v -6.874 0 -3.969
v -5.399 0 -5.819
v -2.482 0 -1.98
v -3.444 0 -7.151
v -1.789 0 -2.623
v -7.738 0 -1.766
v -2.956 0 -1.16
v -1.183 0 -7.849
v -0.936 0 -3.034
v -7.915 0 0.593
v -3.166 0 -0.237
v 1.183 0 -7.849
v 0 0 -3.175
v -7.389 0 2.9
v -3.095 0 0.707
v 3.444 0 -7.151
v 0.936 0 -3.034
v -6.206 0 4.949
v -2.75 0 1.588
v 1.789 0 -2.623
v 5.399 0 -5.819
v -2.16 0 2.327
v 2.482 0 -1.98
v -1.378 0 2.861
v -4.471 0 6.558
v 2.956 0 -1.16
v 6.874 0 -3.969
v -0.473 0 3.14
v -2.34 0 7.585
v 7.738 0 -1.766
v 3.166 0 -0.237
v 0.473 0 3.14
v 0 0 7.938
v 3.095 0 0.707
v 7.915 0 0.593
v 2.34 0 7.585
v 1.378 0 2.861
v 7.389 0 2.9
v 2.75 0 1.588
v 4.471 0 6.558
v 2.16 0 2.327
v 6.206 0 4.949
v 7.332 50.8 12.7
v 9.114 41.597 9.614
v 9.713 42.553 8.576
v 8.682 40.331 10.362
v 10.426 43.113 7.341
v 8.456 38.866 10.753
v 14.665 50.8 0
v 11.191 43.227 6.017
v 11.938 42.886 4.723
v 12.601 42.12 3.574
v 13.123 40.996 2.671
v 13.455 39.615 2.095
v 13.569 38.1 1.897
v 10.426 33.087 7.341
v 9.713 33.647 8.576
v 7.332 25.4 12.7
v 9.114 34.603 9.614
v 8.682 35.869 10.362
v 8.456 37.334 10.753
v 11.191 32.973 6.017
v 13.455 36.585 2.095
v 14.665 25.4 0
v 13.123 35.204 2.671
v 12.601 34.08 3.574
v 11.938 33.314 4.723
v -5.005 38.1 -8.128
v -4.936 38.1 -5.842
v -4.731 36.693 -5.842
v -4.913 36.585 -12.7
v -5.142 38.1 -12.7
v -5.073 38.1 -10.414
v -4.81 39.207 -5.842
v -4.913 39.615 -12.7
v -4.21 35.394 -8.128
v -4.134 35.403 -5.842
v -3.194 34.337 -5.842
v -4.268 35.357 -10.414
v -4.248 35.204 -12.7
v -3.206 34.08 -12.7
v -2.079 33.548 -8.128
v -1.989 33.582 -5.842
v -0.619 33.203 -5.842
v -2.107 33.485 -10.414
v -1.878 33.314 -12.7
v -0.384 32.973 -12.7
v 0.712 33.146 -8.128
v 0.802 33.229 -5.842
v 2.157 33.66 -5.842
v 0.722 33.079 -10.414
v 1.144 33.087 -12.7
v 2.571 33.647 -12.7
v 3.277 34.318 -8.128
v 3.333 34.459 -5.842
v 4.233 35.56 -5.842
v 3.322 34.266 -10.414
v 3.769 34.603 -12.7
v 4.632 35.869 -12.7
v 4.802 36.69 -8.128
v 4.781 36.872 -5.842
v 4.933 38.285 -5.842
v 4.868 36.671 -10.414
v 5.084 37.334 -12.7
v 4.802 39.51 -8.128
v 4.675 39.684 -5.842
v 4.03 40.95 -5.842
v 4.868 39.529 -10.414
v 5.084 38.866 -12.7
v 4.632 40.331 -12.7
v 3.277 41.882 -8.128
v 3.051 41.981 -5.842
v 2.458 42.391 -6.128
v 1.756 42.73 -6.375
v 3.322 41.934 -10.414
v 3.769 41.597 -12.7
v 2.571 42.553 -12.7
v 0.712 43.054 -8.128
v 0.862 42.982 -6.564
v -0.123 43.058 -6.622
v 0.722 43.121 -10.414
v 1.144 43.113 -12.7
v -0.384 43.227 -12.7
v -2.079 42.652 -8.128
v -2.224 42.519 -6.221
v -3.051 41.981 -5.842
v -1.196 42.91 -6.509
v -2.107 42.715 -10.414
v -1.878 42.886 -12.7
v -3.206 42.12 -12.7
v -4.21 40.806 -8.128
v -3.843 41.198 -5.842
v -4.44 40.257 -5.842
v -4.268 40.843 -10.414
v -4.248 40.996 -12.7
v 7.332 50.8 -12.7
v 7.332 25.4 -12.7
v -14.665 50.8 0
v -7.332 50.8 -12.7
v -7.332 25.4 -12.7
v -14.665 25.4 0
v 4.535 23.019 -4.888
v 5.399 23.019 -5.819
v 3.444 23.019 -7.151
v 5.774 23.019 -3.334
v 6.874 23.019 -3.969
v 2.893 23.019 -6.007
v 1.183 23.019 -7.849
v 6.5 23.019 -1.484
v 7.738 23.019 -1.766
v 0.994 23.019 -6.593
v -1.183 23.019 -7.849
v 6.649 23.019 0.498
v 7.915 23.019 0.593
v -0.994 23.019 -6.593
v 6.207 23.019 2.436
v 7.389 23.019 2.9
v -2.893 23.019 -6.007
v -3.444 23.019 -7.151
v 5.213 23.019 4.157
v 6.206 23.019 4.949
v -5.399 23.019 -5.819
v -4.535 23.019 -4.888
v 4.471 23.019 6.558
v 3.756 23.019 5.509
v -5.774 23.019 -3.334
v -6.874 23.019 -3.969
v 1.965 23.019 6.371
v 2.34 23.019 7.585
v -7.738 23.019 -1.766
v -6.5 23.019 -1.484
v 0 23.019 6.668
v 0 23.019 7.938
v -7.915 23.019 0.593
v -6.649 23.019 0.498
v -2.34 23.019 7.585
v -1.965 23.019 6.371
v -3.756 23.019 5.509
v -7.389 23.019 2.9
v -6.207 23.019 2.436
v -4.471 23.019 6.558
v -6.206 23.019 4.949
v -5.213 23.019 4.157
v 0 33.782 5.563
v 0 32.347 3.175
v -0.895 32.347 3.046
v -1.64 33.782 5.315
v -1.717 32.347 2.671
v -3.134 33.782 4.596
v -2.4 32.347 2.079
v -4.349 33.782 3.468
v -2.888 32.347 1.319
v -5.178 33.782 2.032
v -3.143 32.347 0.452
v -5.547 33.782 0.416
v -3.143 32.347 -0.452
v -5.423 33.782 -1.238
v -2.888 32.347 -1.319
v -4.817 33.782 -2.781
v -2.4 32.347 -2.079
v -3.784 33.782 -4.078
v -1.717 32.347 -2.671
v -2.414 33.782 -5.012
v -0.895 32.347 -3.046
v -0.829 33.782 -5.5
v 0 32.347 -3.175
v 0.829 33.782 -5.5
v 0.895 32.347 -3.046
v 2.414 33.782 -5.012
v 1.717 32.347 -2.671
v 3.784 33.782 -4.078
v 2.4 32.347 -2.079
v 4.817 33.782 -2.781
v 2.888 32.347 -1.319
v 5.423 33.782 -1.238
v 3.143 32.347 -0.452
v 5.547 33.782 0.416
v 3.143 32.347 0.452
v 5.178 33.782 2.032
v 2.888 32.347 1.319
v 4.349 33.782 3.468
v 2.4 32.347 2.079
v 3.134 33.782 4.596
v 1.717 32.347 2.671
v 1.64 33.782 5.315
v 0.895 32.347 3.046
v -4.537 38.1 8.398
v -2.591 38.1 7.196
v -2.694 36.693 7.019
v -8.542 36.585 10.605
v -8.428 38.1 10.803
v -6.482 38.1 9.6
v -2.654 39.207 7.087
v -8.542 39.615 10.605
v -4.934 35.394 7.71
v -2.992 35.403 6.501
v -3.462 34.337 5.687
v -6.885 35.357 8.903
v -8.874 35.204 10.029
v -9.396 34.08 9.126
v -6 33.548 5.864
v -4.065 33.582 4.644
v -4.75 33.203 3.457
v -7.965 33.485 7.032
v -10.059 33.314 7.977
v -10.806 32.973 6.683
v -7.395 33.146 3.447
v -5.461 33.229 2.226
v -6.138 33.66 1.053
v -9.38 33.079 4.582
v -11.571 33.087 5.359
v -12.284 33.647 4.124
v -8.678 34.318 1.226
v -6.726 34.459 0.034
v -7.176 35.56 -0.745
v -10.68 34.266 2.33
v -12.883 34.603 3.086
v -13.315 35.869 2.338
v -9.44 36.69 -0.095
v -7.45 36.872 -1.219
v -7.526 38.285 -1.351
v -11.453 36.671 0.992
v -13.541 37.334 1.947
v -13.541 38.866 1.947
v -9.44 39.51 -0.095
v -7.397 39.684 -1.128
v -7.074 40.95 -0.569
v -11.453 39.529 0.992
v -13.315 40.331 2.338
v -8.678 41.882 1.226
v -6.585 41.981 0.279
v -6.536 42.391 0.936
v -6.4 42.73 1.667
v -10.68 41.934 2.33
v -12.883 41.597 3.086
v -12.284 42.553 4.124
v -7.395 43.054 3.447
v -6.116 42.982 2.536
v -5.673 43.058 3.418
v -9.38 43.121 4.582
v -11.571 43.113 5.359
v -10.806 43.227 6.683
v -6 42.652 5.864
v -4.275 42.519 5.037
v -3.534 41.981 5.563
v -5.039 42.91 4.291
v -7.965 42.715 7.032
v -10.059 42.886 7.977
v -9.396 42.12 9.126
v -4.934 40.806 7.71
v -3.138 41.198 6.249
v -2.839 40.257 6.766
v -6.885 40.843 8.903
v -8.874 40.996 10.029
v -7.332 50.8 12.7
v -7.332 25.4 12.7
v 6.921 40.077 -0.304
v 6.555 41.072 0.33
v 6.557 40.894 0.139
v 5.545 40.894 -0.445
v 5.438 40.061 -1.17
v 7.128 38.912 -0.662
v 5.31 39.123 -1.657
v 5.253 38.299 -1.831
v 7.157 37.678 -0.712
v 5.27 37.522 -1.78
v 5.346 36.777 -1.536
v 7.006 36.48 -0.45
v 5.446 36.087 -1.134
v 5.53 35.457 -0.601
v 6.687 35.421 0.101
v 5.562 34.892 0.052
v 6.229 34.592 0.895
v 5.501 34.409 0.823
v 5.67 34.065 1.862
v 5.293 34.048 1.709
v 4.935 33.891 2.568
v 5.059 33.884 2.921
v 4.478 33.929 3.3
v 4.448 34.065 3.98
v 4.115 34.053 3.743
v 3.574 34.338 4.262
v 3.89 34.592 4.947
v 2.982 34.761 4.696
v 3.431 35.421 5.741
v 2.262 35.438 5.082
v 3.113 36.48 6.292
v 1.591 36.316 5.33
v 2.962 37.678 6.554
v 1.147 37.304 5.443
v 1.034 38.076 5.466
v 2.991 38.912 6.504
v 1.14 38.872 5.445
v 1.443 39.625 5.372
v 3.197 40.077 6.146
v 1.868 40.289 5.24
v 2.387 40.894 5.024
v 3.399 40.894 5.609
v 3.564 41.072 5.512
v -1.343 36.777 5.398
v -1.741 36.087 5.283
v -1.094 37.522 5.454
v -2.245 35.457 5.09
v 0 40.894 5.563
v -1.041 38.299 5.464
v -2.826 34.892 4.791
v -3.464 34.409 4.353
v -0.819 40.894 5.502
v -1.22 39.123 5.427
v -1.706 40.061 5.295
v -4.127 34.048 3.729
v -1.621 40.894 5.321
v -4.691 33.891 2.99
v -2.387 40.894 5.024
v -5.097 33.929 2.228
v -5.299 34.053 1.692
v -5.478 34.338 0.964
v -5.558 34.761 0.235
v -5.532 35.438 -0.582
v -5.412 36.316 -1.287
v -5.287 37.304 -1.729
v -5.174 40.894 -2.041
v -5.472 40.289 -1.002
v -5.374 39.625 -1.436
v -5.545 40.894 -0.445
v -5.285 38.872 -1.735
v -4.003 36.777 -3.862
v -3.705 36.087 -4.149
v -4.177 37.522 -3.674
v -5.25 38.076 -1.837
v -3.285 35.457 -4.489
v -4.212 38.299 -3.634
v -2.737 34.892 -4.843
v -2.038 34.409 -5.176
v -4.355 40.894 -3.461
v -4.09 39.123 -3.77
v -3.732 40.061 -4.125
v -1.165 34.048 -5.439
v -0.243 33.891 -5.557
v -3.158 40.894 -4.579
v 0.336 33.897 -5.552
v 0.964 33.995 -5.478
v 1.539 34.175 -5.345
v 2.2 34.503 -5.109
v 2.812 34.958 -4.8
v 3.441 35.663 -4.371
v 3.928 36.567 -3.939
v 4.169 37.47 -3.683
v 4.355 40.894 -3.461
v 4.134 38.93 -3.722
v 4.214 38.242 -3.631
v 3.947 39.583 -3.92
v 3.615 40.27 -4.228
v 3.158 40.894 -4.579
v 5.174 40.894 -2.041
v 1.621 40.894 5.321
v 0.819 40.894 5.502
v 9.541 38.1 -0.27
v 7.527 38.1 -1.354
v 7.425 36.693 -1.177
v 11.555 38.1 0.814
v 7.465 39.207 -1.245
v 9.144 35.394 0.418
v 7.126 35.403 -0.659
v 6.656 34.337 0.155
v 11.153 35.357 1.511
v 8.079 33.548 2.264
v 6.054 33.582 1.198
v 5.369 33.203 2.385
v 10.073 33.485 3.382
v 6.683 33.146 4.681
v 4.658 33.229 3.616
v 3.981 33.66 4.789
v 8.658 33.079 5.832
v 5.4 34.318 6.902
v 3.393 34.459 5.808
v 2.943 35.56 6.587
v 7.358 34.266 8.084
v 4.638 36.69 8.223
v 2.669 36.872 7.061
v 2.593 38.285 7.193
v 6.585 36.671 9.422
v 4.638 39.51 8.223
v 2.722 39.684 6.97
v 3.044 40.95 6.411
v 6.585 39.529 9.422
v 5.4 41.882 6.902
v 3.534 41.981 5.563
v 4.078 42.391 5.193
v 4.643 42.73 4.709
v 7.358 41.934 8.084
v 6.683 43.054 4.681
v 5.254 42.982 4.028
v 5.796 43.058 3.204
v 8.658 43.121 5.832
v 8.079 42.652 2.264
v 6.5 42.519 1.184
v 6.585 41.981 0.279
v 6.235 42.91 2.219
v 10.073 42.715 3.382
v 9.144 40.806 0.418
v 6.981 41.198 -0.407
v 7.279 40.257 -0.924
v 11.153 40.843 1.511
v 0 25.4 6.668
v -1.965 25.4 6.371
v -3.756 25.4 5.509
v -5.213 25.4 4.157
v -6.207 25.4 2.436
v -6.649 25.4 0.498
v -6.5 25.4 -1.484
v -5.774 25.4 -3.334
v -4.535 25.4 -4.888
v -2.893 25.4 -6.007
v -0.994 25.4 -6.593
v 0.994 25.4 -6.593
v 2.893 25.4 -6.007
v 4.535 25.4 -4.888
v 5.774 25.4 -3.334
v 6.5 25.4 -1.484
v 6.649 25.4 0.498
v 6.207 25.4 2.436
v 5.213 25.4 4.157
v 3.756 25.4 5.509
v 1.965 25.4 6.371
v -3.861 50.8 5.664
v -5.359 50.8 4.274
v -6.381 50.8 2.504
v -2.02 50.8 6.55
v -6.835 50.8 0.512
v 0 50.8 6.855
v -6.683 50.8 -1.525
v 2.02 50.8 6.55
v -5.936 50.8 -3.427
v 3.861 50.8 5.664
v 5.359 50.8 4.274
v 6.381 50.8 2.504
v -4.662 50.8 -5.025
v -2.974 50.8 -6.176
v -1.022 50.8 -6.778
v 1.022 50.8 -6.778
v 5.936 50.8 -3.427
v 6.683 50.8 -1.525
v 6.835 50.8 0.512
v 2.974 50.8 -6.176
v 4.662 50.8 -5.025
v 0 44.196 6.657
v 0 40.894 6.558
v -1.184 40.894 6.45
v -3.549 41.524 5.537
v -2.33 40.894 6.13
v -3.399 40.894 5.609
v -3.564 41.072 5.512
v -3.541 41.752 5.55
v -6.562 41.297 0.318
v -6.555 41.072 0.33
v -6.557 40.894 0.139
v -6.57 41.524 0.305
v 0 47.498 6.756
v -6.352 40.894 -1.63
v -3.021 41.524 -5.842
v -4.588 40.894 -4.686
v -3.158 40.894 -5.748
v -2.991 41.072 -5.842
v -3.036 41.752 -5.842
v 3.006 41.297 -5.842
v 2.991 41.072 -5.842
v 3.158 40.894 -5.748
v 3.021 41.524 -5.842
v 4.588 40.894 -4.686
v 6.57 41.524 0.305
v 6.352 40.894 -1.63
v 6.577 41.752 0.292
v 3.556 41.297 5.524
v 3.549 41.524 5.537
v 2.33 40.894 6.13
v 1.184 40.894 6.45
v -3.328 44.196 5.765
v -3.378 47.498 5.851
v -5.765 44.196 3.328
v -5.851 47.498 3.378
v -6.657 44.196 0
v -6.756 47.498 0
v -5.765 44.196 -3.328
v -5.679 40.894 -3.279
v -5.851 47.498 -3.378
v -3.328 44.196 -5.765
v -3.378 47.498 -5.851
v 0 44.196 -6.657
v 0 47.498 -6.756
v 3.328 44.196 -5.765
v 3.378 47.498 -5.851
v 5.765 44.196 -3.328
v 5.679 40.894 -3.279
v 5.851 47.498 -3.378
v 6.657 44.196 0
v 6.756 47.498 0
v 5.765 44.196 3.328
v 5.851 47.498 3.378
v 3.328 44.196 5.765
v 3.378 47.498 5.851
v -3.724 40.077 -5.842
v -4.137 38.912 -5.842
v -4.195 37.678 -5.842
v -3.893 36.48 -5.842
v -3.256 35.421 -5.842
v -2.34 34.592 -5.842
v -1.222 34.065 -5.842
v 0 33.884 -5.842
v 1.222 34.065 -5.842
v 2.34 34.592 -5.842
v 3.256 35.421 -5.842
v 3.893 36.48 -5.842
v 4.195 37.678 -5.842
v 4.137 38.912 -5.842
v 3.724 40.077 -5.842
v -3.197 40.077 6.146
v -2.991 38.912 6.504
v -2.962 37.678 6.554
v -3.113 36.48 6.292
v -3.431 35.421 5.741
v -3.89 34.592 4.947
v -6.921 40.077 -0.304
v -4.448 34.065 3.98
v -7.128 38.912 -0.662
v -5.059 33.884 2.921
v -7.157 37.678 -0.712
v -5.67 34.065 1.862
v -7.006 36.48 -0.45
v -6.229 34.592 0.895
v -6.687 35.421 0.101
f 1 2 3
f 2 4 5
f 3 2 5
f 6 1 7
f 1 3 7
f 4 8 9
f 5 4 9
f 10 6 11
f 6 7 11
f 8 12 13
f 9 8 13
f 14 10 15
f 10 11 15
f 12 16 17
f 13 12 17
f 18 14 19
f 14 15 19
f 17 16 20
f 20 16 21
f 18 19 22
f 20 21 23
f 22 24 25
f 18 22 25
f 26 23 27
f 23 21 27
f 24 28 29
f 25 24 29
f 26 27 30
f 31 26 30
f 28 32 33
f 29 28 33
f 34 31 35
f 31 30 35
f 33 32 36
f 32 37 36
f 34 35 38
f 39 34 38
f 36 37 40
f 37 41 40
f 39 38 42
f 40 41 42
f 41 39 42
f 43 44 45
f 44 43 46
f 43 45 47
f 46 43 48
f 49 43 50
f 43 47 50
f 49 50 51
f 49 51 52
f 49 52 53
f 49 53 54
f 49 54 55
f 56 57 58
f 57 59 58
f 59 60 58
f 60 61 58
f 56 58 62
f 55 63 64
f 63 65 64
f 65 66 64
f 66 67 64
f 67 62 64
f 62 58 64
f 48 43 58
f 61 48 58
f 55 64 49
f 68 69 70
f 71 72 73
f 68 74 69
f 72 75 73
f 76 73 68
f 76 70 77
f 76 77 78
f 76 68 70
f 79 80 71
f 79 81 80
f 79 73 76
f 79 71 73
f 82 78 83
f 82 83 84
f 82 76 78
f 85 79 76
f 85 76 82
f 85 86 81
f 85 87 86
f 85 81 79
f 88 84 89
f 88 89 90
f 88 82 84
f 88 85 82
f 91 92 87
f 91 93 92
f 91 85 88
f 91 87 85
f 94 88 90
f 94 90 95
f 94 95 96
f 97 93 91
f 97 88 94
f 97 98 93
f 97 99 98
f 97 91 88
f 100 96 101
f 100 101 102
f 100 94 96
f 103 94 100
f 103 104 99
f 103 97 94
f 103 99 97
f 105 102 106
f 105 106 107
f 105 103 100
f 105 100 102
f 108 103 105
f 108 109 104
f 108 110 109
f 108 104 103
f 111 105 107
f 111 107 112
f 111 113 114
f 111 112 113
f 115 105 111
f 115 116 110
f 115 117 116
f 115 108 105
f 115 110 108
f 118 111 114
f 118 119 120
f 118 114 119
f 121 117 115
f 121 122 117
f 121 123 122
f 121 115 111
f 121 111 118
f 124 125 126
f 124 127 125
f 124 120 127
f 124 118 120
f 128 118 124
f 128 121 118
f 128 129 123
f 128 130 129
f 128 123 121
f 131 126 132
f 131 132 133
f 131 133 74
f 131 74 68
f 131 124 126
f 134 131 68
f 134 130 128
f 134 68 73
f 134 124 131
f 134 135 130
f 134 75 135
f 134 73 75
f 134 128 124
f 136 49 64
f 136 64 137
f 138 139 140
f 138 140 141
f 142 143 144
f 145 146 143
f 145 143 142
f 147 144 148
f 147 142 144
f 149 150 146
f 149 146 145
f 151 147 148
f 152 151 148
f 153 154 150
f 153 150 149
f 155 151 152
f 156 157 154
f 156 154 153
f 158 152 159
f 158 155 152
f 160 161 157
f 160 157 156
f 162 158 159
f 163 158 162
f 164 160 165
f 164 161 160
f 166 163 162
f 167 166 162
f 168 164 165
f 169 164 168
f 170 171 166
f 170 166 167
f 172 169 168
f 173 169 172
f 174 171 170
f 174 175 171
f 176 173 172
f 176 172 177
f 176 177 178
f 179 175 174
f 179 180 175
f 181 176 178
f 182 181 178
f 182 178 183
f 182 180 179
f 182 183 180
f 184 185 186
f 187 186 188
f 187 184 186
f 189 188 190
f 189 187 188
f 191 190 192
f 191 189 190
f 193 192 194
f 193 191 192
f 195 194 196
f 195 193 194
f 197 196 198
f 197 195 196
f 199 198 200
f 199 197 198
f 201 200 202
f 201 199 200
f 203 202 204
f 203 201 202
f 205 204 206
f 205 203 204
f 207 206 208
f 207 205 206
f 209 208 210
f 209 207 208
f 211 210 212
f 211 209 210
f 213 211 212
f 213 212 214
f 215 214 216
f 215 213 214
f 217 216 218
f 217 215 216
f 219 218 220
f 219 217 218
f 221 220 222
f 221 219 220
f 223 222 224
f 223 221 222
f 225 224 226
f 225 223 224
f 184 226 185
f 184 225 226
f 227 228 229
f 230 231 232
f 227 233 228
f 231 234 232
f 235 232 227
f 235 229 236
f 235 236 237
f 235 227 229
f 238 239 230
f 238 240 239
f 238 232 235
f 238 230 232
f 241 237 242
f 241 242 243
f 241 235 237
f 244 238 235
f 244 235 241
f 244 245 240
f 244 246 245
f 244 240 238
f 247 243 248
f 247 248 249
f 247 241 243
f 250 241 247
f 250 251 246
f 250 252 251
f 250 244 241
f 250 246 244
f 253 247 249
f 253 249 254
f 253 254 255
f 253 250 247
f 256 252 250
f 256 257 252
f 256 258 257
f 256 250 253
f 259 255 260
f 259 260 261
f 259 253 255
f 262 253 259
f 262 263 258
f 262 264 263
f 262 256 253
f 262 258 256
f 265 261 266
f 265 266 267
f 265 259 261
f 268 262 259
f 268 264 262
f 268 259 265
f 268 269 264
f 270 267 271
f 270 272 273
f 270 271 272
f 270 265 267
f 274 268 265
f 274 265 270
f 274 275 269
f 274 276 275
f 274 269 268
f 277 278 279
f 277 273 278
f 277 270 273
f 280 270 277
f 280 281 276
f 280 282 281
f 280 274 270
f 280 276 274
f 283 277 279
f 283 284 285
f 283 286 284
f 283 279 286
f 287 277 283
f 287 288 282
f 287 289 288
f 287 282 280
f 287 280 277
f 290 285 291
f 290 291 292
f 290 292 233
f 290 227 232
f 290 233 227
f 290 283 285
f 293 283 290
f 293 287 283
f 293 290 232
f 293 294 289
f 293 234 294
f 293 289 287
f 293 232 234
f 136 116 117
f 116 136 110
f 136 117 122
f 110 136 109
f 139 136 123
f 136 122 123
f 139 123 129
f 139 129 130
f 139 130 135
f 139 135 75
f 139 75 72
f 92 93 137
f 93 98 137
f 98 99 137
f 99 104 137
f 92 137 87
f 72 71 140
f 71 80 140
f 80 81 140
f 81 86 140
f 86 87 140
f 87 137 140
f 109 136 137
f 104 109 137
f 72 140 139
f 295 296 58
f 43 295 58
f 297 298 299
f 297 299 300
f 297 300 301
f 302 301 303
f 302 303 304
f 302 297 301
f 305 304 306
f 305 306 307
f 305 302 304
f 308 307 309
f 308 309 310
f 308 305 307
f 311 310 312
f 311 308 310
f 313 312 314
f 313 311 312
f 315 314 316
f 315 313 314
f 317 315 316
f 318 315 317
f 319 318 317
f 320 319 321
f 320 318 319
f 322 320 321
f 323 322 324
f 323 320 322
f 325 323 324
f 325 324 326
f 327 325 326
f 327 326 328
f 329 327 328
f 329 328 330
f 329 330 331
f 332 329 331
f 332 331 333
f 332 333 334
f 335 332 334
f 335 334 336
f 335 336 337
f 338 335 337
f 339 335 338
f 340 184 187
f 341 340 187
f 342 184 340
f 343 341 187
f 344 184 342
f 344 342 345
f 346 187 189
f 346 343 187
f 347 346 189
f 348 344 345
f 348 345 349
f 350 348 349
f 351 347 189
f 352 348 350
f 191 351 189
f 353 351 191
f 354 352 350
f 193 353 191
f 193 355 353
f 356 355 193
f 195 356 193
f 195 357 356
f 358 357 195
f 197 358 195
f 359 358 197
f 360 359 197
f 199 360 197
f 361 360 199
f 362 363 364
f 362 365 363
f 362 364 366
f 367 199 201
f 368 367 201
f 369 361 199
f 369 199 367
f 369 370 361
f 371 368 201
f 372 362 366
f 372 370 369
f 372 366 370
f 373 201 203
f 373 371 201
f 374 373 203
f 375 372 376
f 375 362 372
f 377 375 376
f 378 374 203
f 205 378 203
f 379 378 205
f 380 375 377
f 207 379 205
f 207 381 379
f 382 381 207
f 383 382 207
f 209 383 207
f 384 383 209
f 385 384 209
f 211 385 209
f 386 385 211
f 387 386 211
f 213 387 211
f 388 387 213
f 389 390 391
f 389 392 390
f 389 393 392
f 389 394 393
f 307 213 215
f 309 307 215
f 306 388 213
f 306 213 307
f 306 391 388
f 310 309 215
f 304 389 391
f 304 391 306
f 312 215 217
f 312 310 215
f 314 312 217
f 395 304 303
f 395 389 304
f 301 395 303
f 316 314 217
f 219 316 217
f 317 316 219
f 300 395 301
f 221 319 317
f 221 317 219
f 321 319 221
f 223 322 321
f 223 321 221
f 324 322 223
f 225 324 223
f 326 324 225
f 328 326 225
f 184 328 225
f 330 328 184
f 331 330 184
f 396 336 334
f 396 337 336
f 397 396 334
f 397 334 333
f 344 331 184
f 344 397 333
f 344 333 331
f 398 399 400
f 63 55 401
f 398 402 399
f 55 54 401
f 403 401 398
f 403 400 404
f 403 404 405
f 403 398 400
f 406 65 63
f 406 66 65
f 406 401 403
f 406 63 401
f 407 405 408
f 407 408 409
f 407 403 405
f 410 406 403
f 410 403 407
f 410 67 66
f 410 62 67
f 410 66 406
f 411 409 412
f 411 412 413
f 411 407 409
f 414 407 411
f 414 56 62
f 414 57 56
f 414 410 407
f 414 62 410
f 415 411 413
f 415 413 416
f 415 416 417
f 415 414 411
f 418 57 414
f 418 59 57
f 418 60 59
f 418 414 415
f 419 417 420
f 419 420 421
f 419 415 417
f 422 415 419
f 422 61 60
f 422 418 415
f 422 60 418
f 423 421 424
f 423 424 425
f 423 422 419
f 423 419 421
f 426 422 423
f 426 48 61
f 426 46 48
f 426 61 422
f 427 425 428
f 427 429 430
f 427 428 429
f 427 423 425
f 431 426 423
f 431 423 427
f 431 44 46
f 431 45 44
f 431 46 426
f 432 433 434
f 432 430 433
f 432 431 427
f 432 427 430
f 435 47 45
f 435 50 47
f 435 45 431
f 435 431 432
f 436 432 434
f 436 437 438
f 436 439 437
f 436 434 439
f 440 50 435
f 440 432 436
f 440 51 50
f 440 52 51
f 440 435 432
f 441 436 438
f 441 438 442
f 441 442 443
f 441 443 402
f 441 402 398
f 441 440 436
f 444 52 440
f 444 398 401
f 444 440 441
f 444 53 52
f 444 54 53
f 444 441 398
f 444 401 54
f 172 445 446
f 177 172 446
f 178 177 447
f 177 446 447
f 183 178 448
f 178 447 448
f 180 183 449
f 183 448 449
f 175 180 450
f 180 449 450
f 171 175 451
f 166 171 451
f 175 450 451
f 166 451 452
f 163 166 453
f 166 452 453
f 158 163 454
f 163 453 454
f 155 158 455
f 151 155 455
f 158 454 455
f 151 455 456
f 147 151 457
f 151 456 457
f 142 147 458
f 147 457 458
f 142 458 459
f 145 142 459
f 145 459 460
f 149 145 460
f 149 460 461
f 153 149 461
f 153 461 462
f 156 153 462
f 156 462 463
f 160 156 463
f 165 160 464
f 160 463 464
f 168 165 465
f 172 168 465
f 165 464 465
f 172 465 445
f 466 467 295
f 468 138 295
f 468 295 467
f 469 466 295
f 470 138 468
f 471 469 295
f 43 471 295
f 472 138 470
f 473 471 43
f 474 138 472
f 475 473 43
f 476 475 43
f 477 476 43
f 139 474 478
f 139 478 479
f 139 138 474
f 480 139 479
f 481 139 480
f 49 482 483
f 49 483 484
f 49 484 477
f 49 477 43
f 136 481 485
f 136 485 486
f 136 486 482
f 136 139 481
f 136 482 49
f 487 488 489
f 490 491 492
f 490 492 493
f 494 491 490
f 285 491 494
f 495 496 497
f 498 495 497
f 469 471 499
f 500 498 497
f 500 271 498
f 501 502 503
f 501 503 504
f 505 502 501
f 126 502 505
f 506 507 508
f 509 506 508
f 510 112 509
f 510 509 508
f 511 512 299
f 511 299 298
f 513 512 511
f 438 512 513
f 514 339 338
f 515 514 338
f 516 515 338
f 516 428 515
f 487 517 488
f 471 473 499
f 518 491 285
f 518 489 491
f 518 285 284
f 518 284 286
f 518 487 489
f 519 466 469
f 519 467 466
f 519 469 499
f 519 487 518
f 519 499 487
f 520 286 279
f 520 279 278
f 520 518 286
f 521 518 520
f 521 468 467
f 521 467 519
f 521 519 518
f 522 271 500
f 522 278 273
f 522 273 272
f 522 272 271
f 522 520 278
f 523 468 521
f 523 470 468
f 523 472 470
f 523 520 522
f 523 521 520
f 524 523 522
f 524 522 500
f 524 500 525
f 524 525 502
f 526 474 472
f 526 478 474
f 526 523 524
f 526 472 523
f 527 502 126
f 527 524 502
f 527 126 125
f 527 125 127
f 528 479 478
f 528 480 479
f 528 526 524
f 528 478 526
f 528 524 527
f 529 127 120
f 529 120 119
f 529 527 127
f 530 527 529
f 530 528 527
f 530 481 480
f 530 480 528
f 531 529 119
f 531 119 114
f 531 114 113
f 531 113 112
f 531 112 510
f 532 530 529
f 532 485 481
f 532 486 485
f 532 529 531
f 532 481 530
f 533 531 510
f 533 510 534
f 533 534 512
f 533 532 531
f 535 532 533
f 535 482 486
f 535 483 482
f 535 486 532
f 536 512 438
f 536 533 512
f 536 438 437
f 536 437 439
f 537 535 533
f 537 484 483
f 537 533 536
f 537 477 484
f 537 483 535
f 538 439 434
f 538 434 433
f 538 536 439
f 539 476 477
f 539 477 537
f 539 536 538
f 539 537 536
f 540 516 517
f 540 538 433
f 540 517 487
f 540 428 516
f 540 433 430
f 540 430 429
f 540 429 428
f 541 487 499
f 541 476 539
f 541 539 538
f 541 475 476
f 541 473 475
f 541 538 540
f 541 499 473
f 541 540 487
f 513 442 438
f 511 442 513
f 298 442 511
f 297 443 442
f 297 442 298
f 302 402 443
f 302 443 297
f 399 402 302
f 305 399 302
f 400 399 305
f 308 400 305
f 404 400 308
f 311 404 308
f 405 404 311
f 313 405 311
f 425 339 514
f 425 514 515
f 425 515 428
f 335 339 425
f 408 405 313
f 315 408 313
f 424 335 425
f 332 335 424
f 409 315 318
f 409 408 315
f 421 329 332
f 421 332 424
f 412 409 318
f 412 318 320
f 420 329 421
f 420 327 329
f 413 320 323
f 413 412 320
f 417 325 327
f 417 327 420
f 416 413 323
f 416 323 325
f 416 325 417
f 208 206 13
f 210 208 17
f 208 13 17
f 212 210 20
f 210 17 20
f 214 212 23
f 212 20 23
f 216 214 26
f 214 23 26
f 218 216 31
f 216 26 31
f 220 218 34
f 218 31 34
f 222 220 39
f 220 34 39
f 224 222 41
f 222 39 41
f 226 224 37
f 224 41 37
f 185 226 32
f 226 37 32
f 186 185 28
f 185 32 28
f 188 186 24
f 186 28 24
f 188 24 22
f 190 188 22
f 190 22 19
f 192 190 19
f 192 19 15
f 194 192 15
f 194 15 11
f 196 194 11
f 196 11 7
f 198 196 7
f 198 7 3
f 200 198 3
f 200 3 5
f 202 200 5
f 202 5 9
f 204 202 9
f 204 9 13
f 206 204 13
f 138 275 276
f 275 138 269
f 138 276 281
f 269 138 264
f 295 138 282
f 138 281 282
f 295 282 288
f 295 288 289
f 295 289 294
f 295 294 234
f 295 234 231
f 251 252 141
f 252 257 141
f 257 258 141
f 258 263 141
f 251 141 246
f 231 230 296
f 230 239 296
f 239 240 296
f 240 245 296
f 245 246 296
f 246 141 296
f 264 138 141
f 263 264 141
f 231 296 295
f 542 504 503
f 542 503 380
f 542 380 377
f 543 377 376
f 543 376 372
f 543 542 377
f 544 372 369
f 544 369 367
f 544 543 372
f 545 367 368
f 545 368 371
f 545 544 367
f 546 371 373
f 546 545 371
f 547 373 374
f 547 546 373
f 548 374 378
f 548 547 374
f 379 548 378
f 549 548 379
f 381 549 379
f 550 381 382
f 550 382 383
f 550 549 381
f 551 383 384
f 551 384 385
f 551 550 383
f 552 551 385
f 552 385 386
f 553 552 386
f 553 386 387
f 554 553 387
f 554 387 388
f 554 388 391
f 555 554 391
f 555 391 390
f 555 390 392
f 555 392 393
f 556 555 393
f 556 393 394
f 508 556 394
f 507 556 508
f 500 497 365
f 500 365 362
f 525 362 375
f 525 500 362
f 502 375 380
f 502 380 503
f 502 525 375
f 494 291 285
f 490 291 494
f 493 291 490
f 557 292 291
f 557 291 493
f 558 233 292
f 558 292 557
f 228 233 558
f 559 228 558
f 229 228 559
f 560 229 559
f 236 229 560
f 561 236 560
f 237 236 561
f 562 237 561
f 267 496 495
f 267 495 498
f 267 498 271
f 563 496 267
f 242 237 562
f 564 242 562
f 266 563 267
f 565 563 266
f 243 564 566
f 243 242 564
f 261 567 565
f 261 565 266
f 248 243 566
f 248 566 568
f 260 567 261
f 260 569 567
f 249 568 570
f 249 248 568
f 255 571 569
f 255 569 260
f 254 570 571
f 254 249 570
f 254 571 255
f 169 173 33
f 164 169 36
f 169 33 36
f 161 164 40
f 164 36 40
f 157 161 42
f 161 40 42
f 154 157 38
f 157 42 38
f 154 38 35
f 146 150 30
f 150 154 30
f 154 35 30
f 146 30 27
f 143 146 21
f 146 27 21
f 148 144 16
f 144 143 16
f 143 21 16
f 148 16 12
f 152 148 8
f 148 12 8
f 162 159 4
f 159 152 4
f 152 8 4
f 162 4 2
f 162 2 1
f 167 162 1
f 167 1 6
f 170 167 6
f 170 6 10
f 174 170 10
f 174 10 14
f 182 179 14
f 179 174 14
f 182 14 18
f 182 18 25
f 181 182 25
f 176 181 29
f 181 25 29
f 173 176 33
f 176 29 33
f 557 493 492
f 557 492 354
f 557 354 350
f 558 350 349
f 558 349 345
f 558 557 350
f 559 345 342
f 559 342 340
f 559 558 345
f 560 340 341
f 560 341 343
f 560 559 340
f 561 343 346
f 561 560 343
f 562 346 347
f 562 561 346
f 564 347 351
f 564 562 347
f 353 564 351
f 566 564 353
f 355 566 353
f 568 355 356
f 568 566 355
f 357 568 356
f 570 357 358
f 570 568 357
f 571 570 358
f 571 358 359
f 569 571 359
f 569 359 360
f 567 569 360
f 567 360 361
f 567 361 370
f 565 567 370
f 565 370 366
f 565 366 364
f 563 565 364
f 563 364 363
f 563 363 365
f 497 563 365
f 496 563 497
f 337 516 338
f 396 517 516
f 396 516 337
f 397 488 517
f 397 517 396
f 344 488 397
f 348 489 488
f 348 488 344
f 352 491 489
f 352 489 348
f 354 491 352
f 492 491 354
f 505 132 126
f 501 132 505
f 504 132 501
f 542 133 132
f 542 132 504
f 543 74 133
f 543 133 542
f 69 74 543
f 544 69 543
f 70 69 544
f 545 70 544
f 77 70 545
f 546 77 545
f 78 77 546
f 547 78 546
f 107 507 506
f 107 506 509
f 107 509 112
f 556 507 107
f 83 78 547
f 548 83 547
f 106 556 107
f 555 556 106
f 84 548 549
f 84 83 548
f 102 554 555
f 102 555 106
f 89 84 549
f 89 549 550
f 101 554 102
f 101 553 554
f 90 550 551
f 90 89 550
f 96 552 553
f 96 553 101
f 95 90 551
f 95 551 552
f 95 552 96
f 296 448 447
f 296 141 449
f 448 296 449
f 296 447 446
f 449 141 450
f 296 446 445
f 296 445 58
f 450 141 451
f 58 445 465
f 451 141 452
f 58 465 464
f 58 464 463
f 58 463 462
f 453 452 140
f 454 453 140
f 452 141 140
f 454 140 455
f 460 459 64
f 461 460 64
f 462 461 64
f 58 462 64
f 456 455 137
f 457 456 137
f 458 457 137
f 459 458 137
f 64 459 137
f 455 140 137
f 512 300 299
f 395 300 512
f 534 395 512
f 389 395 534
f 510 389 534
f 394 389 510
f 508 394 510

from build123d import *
from OCP.BRepAlgoAPI import BRepAlgoAPI_Cut
from OCP.TopTools import TopTools_ListOfShape

# Parameters (mm, degrees)
SKETCH1_R           = 7.9375
BOSS_EXTRUDE1_DEPTH = 25.4
BOSS_EXTRUDE2_DEPTH = 25.4
SKETCH3_R           = 3.175
CUT_EXTRUDE1_DEPTH  = 55.37815125
SKETCH6_R           = 6.6675
CUT_EXTRUDE2_DEPTH  = 2.38125


with BuildPart() as part:
    # Sketch1 → Boss-Extrude1 (new body)
    with BuildSketch(Plane(origin=(0, 0, 0), x_dir=(1, 0, 0), z_dir=(0, 1, 0))):
        Circle(SKETCH1_R)
    extrude(amount=BOSS_EXTRUDE1_DEPTH)

    # Sketch2 → Boss-Extrude2 (add)
    with BuildSketch(Plane(origin=(0, 25.4, 0), x_dir=(1, 0, 0), z_dir=(0, 1, 0))):
        Polygon((14.664696837, 0), (7.332348419, 12.7), (-7.332348419, 12.7), (-14.664696837, 0), (-7.332348419, -12.7), (7.332348419, -12.7), align=None)
    extrude(amount=BOSS_EXTRUDE2_DEPTH)

    # Sketch3 → Cut-Extrude1 (cut, through all)
    with BuildSketch(Plane.XZ):
        Circle(SKETCH3_R)
    extrude(amount=-CUT_EXTRUDE1_DEPTH, mode=Mode.SUBTRACT)

    # Sketch6 → Cut-Extrude2 (cut)
    with BuildSketch(Plane.XZ.offset(-25.4)):
        Polygon((-14.664696837, 0), (-7.332348419, 12.7), (7.332348419, 12.7), (14.664696837, 0), (7.332348419, -12.7), (-7.332348419, -12.7), align=None)
        Circle(SKETCH6_R, mode=Mode.SUBTRACT)
    extrude(amount=CUT_EXTRUDE2_DEPTH, mode=Mode.SUBTRACT)

    # Sketch4 → 1/4 NPT Tapped Hole1 (revolve, cut)
    with BuildSketch(Plane(origin=(0, 50.8, 0), x_dir=(0, 0, 1), z_dir=(1, 0, 0))):
        Polygon((0, 0), (0, 20.360347279), (5.5626, 17.018), (5.5626, 9.906), (6.557984794, 9.906), (6.8545837, 0), align=None)
    revolve(axis=Axis((0, 57.15, 0), (0, -1, 0)), mode=Mode.SUBTRACT)


with BuildPart() as f_1_8_npt_tapped_hole1_tool:
    # Sketch9 → 1/8 NPT Tapped Hole1 (revolve)
    with BuildSketch(Plane(origin=(10.998522628, 38.1, 6.35), x_dir=(0.4999999999999991, 0, -0.8660254037844392), z_dir=(0, 1, 0))):
        Polygon((0, 0), (0, 14.217468714), (4.2164, 11.684), (4.2164, 6.858), (4.936181096, 6.858), (5.1415188, 0), align=None)
    revolve(axis=Axis((16.497783942, 38.1, 9.525), (-0.8660254037844392, 0, -0.4999999999999991)))


with BuildPart() as part_1:
    add(part.part)

    # 1/8 NPT Tapped Hole1: cut by f_1_8_npt_tapped_hole1_tool, with a tolerance
    f_1_8_npt_tapped_hole1_stock = TopTools_ListOfShape()
    f_1_8_npt_tapped_hole1_stock.Append(part_1.part.wrapped)
    f_1_8_npt_tapped_hole1_tools = TopTools_ListOfShape()
    f_1_8_npt_tapped_hole1_tools.Append(f_1_8_npt_tapped_hole1_tool.part.wrapped)
    f_1_8_npt_tapped_hole1_cut = BRepAlgoAPI_Cut()
    f_1_8_npt_tapped_hole1_cut.SetArguments(f_1_8_npt_tapped_hole1_stock)
    f_1_8_npt_tapped_hole1_cut.SetTools(f_1_8_npt_tapped_hole1_tools)
    f_1_8_npt_tapped_hole1_cut.SetFuzzyValue(0.00001)
    f_1_8_npt_tapped_hole1_cut.Build()
    add(Compound.cast(f_1_8_npt_tapped_hole1_cut.Shape()).solids(), mode=Mode.REPLACE)


with BuildPart() as f_1_8_npt_tapped_hole1_at_2_tool:
    # Sketch9 at point 2 (carried to point 2, square into its face) → 1/8 NPT Tapped Hole1 at 2 (revolve)
    with BuildSketch(Plane(origin=(0, 38.1, -12.7), x_dir=(-1, 0, 0), z_dir=(0, 1, 0))):
        Polygon((0, 0), (0, 14.217468714), (4.2164, 11.684), (4.2164, 6.858), (4.936181096, 6.858), (5.1415188, 0), align=None)
    revolve(axis=Axis((0, 38.1, -19.05), (0, 0, 1)))


with BuildPart() as part_2:
    add(part_1.part)

    # 1/8 NPT Tapped Hole1 at 2: cut by f_1_8_npt_tapped_hole1_at_2_tool, with a tolerance
    f_1_8_npt_tapped_hole1_at_2_stock = TopTools_ListOfShape()
    f_1_8_npt_tapped_hole1_at_2_stock.Append(part_2.part.wrapped)
    f_1_8_npt_tapped_hole1_at_2_tools = TopTools_ListOfShape()
    f_1_8_npt_tapped_hole1_at_2_tools.Append(f_1_8_npt_tapped_hole1_at_2_tool.part.wrapped)
    f_1_8_npt_tapped_hole1_at_2_cut = BRepAlgoAPI_Cut()
    f_1_8_npt_tapped_hole1_at_2_cut.SetArguments(f_1_8_npt_tapped_hole1_at_2_stock)
    f_1_8_npt_tapped_hole1_at_2_cut.SetTools(f_1_8_npt_tapped_hole1_at_2_tools)
    f_1_8_npt_tapped_hole1_at_2_cut.SetFuzzyValue(0.00001)
    f_1_8_npt_tapped_hole1_at_2_cut.Build()
    add(Compound.cast(f_1_8_npt_tapped_hole1_at_2_cut.Shape()).solids(), mode=Mode.REPLACE)


with BuildPart() as f_1_8_npt_tapped_hole1_at_3_tool:
    # Sketch9 at point 3 (carried to point 3, square into its face) → 1/8 NPT Tapped Hole1 at 3 (revolve)
    with BuildSketch(Plane(origin=(-10.998522628, 38.1, 6.35), x_dir=(0.500000175, 0, 0.866025303), z_dir=(0, 1, 0))):
        Polygon((0, 0), (0, 14.217468714), (4.2164, 11.684), (4.2164, 6.858), (4.936181096, 6.858), (5.1415188, 0), align=None)
    revolve(axis=Axis((-16.497783301, 38.1, 9.52500111), (0.866025303, 0, -0.500000175)))


with BuildPart() as part_3:
    add(part_2.part)

    # 1/8 NPT Tapped Hole1 at 3: cut by f_1_8_npt_tapped_hole1_at_3_tool, with a tolerance
    f_1_8_npt_tapped_hole1_at_3_stock = TopTools_ListOfShape()
    f_1_8_npt_tapped_hole1_at_3_stock.Append(part_3.part.wrapped)
    f_1_8_npt_tapped_hole1_at_3_tools = TopTools_ListOfShape()
    f_1_8_npt_tapped_hole1_at_3_tools.Append(f_1_8_npt_tapped_hole1_at_3_tool.part.wrapped)
    f_1_8_npt_tapped_hole1_at_3_cut = BRepAlgoAPI_Cut()
    f_1_8_npt_tapped_hole1_at_3_cut.SetArguments(f_1_8_npt_tapped_hole1_at_3_stock)
    f_1_8_npt_tapped_hole1_at_3_cut.SetTools(f_1_8_npt_tapped_hole1_at_3_tools)
    f_1_8_npt_tapped_hole1_at_3_cut.SetFuzzyValue(0.00001)
    f_1_8_npt_tapped_hole1_at_3_cut.Build()
    add(Compound.cast(f_1_8_npt_tapped_hole1_at_3_cut.Shape()).solids(), mode=Mode.REPLACE)


solid = part_3.part
